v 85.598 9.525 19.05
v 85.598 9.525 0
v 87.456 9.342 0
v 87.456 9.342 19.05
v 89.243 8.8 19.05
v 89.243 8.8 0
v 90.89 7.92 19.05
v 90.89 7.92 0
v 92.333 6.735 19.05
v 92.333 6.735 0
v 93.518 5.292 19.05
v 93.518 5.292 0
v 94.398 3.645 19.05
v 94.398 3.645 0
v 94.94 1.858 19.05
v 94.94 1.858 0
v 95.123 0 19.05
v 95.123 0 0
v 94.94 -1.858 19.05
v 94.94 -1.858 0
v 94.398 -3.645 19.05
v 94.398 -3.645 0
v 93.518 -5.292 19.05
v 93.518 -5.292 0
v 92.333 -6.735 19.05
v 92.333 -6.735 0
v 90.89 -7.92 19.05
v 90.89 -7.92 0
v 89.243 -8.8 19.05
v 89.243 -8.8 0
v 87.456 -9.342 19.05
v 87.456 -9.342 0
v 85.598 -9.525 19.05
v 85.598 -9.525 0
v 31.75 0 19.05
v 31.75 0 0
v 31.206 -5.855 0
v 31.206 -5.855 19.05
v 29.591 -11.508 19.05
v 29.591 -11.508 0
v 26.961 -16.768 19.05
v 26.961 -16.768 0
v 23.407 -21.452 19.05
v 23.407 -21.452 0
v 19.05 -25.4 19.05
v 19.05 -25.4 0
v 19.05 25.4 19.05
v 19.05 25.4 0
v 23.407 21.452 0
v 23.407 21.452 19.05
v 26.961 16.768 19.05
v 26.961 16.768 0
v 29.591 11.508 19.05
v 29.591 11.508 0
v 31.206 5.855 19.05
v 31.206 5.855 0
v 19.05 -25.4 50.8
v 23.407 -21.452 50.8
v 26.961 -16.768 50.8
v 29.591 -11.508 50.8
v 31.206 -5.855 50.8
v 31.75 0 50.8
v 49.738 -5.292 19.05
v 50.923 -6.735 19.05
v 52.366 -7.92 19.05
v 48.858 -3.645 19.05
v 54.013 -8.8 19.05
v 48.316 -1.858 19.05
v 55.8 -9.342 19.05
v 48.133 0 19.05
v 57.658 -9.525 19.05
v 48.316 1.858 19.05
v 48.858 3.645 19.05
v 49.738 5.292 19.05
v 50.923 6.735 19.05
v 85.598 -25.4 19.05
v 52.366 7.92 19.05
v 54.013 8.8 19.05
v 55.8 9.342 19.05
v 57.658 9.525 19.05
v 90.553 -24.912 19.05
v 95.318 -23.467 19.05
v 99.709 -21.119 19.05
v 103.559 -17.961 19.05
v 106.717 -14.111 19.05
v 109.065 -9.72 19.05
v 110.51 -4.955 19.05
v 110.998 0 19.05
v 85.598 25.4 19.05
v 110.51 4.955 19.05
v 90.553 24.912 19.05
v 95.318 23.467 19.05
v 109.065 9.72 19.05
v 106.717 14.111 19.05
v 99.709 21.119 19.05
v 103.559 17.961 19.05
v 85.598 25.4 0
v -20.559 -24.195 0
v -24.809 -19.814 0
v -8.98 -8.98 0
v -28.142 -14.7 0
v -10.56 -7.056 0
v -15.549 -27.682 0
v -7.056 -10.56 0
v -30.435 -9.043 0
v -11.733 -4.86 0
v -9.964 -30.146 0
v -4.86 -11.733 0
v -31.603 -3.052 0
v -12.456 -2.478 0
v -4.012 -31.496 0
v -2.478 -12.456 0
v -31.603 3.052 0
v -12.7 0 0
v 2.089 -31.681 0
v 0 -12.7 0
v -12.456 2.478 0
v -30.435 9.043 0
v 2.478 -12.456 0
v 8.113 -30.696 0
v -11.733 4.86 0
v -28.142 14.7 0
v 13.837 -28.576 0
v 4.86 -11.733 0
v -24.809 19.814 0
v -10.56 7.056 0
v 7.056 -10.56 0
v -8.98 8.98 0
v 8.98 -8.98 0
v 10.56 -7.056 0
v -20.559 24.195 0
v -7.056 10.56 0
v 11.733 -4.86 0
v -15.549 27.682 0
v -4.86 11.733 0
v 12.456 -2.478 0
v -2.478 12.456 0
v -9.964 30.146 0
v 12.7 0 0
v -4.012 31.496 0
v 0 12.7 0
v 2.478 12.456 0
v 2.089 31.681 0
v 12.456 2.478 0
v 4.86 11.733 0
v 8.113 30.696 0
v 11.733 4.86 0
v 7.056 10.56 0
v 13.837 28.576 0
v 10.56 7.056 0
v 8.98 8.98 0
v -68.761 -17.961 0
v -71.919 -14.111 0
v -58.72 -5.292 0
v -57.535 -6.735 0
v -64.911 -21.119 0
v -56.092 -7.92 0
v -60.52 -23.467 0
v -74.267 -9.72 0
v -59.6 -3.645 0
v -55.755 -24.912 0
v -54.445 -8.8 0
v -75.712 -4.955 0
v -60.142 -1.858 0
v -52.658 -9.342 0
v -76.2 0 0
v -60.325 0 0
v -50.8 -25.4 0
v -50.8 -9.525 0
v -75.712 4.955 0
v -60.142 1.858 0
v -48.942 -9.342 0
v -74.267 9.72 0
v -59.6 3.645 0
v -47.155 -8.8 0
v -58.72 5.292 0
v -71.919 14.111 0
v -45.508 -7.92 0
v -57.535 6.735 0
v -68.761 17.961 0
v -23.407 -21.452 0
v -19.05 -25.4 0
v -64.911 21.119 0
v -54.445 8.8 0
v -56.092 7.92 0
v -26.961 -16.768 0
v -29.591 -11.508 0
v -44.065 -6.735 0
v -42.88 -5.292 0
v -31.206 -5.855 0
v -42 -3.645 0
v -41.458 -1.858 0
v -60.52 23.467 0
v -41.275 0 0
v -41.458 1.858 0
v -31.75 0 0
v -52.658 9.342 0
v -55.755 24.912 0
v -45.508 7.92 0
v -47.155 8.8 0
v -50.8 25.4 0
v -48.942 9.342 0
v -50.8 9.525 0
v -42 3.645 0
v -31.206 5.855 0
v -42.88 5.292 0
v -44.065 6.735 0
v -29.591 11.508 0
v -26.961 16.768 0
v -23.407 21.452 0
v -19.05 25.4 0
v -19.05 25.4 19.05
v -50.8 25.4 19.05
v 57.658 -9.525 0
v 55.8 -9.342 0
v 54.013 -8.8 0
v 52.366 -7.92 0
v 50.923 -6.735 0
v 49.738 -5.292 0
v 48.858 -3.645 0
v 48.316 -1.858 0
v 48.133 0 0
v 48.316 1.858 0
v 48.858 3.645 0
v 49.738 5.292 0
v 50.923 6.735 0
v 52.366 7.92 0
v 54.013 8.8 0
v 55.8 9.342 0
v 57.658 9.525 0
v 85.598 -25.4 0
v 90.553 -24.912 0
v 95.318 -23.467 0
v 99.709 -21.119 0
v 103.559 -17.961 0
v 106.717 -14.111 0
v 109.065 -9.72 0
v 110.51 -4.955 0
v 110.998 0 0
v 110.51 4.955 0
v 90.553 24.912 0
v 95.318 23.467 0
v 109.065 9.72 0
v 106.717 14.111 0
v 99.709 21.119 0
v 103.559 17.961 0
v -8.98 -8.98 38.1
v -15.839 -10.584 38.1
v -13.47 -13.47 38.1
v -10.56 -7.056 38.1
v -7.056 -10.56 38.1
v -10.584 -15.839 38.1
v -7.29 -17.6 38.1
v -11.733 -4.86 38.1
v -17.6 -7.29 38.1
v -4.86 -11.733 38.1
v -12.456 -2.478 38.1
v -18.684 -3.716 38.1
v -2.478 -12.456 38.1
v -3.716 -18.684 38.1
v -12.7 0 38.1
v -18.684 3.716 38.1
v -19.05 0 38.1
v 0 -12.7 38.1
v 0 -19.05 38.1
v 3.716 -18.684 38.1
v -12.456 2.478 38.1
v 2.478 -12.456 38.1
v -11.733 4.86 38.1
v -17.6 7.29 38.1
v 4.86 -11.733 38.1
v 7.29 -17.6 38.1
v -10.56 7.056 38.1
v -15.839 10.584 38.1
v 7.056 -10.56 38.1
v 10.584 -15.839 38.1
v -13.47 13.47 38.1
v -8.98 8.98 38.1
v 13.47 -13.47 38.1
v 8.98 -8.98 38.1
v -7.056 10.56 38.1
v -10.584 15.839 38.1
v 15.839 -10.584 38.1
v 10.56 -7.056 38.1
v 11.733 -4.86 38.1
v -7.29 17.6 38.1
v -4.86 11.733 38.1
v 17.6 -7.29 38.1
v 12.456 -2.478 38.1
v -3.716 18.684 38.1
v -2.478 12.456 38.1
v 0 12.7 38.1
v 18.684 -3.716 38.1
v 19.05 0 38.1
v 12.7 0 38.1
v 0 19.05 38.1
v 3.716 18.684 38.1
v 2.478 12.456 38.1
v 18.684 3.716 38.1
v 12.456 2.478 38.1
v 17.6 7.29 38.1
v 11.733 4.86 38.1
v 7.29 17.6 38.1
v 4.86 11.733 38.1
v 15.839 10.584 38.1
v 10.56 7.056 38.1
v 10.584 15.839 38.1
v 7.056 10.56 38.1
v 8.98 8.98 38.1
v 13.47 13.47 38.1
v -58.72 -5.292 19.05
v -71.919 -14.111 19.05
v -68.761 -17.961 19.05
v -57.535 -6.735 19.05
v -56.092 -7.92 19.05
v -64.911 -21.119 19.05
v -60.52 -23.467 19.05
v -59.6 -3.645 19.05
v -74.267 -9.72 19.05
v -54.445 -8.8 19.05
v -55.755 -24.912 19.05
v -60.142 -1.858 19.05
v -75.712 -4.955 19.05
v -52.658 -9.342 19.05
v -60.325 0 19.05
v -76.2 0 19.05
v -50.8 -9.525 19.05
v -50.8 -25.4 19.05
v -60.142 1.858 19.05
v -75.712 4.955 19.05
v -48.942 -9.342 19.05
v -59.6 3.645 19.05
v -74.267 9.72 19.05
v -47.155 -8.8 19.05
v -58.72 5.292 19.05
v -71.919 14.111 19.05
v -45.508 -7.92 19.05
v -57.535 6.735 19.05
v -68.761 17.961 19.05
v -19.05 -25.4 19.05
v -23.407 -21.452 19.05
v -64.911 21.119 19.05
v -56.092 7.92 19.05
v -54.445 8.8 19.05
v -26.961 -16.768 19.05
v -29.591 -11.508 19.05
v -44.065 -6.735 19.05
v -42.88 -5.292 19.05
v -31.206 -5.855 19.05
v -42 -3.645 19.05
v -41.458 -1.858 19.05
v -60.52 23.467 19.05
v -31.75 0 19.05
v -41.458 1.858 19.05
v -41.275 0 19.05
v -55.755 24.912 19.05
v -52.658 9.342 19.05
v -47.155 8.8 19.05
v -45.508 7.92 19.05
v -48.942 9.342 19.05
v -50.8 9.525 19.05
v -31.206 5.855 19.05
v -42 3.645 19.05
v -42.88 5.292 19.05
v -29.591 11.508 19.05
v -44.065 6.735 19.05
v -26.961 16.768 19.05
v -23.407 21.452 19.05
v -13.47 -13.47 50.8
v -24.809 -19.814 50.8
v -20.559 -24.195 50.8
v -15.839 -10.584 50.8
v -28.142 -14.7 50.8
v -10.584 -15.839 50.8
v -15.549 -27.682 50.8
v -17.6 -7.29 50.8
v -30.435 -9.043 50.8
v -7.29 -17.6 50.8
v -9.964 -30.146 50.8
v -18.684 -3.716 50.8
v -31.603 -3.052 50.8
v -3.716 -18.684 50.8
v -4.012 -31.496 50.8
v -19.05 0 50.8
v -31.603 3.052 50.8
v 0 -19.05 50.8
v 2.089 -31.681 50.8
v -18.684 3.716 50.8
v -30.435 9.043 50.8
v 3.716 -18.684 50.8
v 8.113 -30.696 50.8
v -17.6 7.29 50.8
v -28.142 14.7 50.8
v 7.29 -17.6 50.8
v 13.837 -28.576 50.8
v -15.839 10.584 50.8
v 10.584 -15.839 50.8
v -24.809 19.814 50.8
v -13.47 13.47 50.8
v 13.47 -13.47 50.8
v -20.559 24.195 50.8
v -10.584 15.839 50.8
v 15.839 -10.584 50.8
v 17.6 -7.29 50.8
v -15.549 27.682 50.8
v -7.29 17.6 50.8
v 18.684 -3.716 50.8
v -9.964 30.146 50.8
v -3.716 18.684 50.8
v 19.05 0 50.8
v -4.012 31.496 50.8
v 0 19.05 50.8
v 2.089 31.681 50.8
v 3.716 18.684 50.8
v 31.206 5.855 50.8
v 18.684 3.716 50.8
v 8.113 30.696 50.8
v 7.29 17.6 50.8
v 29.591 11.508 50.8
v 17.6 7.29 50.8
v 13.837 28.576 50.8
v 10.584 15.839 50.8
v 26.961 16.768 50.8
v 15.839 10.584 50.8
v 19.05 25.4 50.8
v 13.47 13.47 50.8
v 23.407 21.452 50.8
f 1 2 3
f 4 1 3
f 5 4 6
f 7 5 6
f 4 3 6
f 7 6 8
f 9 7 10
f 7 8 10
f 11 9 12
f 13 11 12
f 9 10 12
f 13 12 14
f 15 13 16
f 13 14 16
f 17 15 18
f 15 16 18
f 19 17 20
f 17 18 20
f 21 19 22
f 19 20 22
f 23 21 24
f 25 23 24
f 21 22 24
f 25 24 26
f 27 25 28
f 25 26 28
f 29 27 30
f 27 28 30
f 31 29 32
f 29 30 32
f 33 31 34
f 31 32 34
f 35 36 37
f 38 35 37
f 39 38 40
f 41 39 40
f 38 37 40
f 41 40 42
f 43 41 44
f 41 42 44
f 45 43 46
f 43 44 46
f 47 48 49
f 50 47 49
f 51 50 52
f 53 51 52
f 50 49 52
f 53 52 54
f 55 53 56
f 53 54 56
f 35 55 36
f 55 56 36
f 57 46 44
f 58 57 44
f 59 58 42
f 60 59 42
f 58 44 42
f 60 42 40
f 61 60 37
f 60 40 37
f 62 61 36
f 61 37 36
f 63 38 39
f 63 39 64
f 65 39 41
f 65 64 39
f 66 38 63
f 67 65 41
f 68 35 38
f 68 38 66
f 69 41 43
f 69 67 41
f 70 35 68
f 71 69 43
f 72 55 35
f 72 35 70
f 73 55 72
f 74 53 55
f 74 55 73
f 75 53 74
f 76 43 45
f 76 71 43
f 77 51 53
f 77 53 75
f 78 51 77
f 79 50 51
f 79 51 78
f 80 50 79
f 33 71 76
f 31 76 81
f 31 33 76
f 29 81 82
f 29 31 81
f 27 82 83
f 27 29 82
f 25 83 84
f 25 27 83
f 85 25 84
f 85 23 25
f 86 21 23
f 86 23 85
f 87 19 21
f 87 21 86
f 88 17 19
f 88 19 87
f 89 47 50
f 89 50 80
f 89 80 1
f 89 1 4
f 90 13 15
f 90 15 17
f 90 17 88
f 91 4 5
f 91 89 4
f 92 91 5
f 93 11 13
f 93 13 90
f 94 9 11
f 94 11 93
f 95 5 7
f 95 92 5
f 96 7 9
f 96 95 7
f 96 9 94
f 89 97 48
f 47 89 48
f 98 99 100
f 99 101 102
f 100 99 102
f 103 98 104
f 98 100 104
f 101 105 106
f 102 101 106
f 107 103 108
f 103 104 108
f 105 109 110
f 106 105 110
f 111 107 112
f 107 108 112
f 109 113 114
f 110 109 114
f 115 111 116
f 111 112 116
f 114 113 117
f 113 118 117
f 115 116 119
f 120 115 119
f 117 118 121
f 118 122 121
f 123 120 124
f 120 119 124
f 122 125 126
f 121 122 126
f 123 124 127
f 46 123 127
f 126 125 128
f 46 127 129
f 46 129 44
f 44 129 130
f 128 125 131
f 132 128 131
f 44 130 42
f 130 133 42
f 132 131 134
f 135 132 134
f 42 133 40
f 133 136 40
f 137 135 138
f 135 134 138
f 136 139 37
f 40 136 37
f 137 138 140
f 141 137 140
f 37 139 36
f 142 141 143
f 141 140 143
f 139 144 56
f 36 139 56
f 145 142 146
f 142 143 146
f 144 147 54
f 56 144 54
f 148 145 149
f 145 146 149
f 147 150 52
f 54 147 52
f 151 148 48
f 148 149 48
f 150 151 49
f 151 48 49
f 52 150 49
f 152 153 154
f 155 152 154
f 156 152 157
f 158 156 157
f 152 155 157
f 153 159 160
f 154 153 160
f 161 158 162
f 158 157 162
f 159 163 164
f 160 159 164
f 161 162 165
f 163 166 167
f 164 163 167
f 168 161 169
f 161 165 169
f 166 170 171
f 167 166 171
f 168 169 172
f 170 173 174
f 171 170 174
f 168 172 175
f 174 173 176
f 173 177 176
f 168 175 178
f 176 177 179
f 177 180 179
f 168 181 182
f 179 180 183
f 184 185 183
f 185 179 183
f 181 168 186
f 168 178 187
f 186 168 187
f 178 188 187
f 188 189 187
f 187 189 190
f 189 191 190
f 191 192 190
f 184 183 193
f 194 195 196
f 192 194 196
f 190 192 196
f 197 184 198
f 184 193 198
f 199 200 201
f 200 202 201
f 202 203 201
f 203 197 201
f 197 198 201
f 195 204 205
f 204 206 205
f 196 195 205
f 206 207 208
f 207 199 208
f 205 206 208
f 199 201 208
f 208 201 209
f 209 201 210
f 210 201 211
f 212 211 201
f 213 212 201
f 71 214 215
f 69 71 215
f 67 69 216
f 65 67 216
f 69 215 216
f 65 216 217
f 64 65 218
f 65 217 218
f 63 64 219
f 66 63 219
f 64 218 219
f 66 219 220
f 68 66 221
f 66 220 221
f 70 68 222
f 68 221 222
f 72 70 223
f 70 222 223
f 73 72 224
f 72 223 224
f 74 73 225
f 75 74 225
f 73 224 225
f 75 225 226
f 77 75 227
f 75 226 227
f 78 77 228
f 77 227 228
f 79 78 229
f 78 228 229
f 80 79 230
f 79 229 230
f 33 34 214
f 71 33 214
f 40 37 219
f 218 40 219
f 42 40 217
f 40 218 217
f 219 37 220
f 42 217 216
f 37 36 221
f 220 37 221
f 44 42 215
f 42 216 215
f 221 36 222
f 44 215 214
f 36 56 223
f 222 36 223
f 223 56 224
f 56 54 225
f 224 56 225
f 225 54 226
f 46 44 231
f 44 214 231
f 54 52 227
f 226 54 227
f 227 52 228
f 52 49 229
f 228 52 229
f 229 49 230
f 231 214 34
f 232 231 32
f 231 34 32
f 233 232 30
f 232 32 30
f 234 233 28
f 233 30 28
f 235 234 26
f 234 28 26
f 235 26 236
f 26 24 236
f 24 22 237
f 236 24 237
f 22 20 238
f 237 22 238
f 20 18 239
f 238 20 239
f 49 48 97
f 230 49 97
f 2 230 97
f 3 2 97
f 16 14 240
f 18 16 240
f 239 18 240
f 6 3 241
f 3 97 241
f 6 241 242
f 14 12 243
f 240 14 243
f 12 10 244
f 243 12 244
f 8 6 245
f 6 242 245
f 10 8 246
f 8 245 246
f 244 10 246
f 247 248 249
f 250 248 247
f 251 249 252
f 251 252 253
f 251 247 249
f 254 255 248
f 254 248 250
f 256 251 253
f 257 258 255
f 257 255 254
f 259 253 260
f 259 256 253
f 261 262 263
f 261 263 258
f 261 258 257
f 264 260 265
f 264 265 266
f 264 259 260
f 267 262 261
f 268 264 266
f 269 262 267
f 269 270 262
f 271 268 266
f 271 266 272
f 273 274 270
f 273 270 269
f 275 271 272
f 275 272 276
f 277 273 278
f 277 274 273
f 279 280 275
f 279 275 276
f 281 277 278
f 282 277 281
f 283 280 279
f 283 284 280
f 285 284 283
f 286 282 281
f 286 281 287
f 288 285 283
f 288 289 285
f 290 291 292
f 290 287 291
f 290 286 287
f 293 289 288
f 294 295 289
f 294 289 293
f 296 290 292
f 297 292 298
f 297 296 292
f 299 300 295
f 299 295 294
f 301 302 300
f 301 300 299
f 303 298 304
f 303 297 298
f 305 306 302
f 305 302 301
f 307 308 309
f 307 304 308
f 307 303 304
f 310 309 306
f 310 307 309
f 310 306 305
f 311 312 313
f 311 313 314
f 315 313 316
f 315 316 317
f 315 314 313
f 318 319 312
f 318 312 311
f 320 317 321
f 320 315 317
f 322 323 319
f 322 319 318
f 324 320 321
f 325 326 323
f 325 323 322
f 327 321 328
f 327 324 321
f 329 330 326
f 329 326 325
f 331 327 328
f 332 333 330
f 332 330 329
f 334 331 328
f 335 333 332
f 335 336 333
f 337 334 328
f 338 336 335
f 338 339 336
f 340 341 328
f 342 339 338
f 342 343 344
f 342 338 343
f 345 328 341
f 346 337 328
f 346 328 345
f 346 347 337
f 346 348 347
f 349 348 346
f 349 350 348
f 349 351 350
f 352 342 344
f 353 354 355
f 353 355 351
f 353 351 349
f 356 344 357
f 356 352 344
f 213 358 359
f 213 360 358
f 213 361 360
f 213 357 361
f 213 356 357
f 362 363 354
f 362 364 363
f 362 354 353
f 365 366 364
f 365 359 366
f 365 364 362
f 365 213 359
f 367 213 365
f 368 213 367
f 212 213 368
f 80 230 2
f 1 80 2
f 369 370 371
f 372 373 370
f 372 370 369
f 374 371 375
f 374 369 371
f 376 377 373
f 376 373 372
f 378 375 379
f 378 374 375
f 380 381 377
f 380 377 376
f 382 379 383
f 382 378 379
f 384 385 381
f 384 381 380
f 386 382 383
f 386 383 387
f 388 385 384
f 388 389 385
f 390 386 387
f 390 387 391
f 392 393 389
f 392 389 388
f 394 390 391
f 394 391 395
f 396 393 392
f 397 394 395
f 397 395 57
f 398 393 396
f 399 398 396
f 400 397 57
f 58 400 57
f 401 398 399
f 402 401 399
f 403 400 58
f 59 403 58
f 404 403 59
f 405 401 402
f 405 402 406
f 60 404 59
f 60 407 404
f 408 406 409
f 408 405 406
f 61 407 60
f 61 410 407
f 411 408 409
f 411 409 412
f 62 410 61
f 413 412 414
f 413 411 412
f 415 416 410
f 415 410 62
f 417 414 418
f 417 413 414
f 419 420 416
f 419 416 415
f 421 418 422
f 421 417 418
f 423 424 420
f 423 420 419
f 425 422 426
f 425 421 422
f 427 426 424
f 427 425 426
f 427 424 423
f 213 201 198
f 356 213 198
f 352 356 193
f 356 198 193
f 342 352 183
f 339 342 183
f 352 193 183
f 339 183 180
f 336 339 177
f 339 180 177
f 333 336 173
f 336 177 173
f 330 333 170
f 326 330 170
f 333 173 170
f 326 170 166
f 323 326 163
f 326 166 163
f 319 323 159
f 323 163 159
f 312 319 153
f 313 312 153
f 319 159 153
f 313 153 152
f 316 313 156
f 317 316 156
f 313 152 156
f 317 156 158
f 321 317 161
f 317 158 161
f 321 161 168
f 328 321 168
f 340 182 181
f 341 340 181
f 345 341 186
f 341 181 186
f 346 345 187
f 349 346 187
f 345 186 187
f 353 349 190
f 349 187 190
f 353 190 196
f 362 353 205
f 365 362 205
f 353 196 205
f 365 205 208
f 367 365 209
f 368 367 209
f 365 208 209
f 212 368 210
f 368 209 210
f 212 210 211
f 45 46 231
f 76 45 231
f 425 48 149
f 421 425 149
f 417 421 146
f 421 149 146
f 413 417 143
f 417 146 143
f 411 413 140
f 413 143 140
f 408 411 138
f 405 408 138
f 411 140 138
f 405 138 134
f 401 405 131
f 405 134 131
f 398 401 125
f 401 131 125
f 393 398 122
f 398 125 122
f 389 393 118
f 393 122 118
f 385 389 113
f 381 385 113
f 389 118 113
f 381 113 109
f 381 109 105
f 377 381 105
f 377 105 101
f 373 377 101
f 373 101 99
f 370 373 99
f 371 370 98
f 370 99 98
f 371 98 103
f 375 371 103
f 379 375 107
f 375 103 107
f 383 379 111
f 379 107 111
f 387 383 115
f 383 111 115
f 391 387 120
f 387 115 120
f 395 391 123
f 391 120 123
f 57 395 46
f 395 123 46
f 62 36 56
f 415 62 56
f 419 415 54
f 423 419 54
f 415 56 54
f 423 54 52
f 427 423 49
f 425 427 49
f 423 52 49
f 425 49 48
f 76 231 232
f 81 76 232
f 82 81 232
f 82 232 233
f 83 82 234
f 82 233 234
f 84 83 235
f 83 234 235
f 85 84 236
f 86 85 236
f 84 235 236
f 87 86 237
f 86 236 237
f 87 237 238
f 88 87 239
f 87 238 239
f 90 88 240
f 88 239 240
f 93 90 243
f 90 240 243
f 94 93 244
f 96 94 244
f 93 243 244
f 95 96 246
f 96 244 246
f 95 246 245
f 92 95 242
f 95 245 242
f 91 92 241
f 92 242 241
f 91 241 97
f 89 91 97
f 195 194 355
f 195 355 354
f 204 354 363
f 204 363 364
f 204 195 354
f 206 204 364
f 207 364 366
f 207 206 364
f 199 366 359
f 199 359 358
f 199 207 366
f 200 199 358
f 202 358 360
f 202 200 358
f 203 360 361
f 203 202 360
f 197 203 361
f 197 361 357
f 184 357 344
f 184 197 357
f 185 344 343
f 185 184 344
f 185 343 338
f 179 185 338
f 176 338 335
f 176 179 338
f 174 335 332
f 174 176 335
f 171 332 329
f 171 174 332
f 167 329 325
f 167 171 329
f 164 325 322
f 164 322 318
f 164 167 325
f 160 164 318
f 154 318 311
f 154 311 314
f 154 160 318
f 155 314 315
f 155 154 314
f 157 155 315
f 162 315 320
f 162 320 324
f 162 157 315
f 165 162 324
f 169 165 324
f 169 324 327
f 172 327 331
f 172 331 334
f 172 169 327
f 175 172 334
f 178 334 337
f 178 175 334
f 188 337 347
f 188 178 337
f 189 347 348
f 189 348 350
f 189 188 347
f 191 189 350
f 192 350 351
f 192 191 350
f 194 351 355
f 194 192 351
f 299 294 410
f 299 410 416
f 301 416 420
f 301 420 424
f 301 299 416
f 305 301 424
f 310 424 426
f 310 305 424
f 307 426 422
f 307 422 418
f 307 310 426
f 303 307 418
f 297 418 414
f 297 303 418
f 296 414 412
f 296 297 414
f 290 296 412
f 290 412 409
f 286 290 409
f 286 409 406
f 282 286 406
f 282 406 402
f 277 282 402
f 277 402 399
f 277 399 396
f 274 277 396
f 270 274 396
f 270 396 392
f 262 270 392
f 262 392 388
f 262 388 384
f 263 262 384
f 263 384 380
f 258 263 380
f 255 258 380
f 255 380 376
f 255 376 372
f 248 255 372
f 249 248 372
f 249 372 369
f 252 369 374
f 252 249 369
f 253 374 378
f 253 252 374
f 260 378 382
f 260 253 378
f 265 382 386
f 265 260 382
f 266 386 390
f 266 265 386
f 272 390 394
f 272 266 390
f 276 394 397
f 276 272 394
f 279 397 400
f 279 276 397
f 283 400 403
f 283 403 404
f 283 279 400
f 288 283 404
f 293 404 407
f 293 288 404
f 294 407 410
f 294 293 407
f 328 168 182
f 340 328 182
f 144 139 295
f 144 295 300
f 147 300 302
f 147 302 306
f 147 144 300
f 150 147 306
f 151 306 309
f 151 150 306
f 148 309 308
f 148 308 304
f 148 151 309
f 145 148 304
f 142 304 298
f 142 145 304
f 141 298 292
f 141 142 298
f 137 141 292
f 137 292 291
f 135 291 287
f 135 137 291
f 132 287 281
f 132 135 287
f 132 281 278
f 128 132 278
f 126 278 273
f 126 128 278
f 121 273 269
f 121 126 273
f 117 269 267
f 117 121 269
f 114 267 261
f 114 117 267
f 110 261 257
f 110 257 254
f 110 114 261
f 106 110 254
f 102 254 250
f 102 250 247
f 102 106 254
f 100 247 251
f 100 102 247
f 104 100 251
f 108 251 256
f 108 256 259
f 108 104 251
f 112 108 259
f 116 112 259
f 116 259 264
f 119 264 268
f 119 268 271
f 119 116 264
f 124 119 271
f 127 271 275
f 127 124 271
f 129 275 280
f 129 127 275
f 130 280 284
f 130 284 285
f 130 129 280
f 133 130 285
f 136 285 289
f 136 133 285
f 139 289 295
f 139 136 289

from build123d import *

# Parameters (mm, degrees)
F0_R     = 9.525
F1_DEPTH = 19.05
F0_R_2   = 19.05
F2_DEPTH = 50.8
F0_R_3   = 12.7
F3_DEPTH = 38.1


with BuildPart() as f1:
    # F0 (on Top) → F1 (new body)
    with BuildSketch(Plane.XY):
        with BuildLine():
            ThreePointArc((-19.05, -25.4), (-31.75, 0), (-19.05, 25.4))
            Line((-19.05, 25.4), (-50.8, 25.4))
            ThreePointArc((-50.8, 25.4), (-76.2, 0), (-50.8, -25.4))
            Line((-50.8, -25.4), (-19.05, -25.4))
        make_face()
        with Locations((-50.8, 0)):
            Circle(F0_R, mode=Mode.SUBTRACT)
        with BuildLine():
            ThreePointArc((19.05, 25.4), (28.398063, 14.199032), (31.75, 0))
            ThreePointArc((31.75, 0), (28.398063, -14.199032), (19.05, -25.4))
            Line((19.05, -25.4), (85.598, -25.4))
            ThreePointArc((85.598, -25.4), (110.998, 0), (85.598, 25.4))
            Line((85.598, 25.4), (19.05, 25.4))
        make_face()
        with BuildLine():
            ThreePointArc((85.598, 9.525), (95.123, 0), (85.598, -9.525))
            Line((85.598, -9.525), (57.658, -9.525))
            ThreePointArc((57.658, -9.525), (48.133, 0), (57.658, 9.525))
            Line((57.658, 9.525), (85.598, 9.525))
        make_face(mode=Mode.SUBTRACT)
    extrude(amount=F1_DEPTH)


with BuildPart() as f2:
    # F0 (on Top) → F2 (new body)
    with BuildSketch(Plane.XY):
        with BuildLine():
            ThreePointArc((19.05, -25.4), (28.398063, -14.199032), (31.75, 0))
            ThreePointArc((31.75, 0), (28.398063, 14.199032), (19.05, 25.4))
            ThreePointArc((19.05, 25.4), (0, 31.75), (-19.05, 25.4))
            ThreePointArc((-19.05, 25.4), (-31.75, 0), (-19.05, -25.4))
            ThreePointArc((-19.05, -25.4), (0, -31.75), (19.05, -25.4))
        make_face()
        Circle(F0_R_2, mode=Mode.SUBTRACT)
    extrude(amount=F2_DEPTH)

    # F0 (on Top) → F3 (join)
    with BuildSketch(Plane.XY):
        Circle(F0_R_2)
        Circle(F0_R_3, mode=Mode.SUBTRACT)
    extrude(amount=F3_DEPTH)


solid = Compound([f1.part, f2.part])
